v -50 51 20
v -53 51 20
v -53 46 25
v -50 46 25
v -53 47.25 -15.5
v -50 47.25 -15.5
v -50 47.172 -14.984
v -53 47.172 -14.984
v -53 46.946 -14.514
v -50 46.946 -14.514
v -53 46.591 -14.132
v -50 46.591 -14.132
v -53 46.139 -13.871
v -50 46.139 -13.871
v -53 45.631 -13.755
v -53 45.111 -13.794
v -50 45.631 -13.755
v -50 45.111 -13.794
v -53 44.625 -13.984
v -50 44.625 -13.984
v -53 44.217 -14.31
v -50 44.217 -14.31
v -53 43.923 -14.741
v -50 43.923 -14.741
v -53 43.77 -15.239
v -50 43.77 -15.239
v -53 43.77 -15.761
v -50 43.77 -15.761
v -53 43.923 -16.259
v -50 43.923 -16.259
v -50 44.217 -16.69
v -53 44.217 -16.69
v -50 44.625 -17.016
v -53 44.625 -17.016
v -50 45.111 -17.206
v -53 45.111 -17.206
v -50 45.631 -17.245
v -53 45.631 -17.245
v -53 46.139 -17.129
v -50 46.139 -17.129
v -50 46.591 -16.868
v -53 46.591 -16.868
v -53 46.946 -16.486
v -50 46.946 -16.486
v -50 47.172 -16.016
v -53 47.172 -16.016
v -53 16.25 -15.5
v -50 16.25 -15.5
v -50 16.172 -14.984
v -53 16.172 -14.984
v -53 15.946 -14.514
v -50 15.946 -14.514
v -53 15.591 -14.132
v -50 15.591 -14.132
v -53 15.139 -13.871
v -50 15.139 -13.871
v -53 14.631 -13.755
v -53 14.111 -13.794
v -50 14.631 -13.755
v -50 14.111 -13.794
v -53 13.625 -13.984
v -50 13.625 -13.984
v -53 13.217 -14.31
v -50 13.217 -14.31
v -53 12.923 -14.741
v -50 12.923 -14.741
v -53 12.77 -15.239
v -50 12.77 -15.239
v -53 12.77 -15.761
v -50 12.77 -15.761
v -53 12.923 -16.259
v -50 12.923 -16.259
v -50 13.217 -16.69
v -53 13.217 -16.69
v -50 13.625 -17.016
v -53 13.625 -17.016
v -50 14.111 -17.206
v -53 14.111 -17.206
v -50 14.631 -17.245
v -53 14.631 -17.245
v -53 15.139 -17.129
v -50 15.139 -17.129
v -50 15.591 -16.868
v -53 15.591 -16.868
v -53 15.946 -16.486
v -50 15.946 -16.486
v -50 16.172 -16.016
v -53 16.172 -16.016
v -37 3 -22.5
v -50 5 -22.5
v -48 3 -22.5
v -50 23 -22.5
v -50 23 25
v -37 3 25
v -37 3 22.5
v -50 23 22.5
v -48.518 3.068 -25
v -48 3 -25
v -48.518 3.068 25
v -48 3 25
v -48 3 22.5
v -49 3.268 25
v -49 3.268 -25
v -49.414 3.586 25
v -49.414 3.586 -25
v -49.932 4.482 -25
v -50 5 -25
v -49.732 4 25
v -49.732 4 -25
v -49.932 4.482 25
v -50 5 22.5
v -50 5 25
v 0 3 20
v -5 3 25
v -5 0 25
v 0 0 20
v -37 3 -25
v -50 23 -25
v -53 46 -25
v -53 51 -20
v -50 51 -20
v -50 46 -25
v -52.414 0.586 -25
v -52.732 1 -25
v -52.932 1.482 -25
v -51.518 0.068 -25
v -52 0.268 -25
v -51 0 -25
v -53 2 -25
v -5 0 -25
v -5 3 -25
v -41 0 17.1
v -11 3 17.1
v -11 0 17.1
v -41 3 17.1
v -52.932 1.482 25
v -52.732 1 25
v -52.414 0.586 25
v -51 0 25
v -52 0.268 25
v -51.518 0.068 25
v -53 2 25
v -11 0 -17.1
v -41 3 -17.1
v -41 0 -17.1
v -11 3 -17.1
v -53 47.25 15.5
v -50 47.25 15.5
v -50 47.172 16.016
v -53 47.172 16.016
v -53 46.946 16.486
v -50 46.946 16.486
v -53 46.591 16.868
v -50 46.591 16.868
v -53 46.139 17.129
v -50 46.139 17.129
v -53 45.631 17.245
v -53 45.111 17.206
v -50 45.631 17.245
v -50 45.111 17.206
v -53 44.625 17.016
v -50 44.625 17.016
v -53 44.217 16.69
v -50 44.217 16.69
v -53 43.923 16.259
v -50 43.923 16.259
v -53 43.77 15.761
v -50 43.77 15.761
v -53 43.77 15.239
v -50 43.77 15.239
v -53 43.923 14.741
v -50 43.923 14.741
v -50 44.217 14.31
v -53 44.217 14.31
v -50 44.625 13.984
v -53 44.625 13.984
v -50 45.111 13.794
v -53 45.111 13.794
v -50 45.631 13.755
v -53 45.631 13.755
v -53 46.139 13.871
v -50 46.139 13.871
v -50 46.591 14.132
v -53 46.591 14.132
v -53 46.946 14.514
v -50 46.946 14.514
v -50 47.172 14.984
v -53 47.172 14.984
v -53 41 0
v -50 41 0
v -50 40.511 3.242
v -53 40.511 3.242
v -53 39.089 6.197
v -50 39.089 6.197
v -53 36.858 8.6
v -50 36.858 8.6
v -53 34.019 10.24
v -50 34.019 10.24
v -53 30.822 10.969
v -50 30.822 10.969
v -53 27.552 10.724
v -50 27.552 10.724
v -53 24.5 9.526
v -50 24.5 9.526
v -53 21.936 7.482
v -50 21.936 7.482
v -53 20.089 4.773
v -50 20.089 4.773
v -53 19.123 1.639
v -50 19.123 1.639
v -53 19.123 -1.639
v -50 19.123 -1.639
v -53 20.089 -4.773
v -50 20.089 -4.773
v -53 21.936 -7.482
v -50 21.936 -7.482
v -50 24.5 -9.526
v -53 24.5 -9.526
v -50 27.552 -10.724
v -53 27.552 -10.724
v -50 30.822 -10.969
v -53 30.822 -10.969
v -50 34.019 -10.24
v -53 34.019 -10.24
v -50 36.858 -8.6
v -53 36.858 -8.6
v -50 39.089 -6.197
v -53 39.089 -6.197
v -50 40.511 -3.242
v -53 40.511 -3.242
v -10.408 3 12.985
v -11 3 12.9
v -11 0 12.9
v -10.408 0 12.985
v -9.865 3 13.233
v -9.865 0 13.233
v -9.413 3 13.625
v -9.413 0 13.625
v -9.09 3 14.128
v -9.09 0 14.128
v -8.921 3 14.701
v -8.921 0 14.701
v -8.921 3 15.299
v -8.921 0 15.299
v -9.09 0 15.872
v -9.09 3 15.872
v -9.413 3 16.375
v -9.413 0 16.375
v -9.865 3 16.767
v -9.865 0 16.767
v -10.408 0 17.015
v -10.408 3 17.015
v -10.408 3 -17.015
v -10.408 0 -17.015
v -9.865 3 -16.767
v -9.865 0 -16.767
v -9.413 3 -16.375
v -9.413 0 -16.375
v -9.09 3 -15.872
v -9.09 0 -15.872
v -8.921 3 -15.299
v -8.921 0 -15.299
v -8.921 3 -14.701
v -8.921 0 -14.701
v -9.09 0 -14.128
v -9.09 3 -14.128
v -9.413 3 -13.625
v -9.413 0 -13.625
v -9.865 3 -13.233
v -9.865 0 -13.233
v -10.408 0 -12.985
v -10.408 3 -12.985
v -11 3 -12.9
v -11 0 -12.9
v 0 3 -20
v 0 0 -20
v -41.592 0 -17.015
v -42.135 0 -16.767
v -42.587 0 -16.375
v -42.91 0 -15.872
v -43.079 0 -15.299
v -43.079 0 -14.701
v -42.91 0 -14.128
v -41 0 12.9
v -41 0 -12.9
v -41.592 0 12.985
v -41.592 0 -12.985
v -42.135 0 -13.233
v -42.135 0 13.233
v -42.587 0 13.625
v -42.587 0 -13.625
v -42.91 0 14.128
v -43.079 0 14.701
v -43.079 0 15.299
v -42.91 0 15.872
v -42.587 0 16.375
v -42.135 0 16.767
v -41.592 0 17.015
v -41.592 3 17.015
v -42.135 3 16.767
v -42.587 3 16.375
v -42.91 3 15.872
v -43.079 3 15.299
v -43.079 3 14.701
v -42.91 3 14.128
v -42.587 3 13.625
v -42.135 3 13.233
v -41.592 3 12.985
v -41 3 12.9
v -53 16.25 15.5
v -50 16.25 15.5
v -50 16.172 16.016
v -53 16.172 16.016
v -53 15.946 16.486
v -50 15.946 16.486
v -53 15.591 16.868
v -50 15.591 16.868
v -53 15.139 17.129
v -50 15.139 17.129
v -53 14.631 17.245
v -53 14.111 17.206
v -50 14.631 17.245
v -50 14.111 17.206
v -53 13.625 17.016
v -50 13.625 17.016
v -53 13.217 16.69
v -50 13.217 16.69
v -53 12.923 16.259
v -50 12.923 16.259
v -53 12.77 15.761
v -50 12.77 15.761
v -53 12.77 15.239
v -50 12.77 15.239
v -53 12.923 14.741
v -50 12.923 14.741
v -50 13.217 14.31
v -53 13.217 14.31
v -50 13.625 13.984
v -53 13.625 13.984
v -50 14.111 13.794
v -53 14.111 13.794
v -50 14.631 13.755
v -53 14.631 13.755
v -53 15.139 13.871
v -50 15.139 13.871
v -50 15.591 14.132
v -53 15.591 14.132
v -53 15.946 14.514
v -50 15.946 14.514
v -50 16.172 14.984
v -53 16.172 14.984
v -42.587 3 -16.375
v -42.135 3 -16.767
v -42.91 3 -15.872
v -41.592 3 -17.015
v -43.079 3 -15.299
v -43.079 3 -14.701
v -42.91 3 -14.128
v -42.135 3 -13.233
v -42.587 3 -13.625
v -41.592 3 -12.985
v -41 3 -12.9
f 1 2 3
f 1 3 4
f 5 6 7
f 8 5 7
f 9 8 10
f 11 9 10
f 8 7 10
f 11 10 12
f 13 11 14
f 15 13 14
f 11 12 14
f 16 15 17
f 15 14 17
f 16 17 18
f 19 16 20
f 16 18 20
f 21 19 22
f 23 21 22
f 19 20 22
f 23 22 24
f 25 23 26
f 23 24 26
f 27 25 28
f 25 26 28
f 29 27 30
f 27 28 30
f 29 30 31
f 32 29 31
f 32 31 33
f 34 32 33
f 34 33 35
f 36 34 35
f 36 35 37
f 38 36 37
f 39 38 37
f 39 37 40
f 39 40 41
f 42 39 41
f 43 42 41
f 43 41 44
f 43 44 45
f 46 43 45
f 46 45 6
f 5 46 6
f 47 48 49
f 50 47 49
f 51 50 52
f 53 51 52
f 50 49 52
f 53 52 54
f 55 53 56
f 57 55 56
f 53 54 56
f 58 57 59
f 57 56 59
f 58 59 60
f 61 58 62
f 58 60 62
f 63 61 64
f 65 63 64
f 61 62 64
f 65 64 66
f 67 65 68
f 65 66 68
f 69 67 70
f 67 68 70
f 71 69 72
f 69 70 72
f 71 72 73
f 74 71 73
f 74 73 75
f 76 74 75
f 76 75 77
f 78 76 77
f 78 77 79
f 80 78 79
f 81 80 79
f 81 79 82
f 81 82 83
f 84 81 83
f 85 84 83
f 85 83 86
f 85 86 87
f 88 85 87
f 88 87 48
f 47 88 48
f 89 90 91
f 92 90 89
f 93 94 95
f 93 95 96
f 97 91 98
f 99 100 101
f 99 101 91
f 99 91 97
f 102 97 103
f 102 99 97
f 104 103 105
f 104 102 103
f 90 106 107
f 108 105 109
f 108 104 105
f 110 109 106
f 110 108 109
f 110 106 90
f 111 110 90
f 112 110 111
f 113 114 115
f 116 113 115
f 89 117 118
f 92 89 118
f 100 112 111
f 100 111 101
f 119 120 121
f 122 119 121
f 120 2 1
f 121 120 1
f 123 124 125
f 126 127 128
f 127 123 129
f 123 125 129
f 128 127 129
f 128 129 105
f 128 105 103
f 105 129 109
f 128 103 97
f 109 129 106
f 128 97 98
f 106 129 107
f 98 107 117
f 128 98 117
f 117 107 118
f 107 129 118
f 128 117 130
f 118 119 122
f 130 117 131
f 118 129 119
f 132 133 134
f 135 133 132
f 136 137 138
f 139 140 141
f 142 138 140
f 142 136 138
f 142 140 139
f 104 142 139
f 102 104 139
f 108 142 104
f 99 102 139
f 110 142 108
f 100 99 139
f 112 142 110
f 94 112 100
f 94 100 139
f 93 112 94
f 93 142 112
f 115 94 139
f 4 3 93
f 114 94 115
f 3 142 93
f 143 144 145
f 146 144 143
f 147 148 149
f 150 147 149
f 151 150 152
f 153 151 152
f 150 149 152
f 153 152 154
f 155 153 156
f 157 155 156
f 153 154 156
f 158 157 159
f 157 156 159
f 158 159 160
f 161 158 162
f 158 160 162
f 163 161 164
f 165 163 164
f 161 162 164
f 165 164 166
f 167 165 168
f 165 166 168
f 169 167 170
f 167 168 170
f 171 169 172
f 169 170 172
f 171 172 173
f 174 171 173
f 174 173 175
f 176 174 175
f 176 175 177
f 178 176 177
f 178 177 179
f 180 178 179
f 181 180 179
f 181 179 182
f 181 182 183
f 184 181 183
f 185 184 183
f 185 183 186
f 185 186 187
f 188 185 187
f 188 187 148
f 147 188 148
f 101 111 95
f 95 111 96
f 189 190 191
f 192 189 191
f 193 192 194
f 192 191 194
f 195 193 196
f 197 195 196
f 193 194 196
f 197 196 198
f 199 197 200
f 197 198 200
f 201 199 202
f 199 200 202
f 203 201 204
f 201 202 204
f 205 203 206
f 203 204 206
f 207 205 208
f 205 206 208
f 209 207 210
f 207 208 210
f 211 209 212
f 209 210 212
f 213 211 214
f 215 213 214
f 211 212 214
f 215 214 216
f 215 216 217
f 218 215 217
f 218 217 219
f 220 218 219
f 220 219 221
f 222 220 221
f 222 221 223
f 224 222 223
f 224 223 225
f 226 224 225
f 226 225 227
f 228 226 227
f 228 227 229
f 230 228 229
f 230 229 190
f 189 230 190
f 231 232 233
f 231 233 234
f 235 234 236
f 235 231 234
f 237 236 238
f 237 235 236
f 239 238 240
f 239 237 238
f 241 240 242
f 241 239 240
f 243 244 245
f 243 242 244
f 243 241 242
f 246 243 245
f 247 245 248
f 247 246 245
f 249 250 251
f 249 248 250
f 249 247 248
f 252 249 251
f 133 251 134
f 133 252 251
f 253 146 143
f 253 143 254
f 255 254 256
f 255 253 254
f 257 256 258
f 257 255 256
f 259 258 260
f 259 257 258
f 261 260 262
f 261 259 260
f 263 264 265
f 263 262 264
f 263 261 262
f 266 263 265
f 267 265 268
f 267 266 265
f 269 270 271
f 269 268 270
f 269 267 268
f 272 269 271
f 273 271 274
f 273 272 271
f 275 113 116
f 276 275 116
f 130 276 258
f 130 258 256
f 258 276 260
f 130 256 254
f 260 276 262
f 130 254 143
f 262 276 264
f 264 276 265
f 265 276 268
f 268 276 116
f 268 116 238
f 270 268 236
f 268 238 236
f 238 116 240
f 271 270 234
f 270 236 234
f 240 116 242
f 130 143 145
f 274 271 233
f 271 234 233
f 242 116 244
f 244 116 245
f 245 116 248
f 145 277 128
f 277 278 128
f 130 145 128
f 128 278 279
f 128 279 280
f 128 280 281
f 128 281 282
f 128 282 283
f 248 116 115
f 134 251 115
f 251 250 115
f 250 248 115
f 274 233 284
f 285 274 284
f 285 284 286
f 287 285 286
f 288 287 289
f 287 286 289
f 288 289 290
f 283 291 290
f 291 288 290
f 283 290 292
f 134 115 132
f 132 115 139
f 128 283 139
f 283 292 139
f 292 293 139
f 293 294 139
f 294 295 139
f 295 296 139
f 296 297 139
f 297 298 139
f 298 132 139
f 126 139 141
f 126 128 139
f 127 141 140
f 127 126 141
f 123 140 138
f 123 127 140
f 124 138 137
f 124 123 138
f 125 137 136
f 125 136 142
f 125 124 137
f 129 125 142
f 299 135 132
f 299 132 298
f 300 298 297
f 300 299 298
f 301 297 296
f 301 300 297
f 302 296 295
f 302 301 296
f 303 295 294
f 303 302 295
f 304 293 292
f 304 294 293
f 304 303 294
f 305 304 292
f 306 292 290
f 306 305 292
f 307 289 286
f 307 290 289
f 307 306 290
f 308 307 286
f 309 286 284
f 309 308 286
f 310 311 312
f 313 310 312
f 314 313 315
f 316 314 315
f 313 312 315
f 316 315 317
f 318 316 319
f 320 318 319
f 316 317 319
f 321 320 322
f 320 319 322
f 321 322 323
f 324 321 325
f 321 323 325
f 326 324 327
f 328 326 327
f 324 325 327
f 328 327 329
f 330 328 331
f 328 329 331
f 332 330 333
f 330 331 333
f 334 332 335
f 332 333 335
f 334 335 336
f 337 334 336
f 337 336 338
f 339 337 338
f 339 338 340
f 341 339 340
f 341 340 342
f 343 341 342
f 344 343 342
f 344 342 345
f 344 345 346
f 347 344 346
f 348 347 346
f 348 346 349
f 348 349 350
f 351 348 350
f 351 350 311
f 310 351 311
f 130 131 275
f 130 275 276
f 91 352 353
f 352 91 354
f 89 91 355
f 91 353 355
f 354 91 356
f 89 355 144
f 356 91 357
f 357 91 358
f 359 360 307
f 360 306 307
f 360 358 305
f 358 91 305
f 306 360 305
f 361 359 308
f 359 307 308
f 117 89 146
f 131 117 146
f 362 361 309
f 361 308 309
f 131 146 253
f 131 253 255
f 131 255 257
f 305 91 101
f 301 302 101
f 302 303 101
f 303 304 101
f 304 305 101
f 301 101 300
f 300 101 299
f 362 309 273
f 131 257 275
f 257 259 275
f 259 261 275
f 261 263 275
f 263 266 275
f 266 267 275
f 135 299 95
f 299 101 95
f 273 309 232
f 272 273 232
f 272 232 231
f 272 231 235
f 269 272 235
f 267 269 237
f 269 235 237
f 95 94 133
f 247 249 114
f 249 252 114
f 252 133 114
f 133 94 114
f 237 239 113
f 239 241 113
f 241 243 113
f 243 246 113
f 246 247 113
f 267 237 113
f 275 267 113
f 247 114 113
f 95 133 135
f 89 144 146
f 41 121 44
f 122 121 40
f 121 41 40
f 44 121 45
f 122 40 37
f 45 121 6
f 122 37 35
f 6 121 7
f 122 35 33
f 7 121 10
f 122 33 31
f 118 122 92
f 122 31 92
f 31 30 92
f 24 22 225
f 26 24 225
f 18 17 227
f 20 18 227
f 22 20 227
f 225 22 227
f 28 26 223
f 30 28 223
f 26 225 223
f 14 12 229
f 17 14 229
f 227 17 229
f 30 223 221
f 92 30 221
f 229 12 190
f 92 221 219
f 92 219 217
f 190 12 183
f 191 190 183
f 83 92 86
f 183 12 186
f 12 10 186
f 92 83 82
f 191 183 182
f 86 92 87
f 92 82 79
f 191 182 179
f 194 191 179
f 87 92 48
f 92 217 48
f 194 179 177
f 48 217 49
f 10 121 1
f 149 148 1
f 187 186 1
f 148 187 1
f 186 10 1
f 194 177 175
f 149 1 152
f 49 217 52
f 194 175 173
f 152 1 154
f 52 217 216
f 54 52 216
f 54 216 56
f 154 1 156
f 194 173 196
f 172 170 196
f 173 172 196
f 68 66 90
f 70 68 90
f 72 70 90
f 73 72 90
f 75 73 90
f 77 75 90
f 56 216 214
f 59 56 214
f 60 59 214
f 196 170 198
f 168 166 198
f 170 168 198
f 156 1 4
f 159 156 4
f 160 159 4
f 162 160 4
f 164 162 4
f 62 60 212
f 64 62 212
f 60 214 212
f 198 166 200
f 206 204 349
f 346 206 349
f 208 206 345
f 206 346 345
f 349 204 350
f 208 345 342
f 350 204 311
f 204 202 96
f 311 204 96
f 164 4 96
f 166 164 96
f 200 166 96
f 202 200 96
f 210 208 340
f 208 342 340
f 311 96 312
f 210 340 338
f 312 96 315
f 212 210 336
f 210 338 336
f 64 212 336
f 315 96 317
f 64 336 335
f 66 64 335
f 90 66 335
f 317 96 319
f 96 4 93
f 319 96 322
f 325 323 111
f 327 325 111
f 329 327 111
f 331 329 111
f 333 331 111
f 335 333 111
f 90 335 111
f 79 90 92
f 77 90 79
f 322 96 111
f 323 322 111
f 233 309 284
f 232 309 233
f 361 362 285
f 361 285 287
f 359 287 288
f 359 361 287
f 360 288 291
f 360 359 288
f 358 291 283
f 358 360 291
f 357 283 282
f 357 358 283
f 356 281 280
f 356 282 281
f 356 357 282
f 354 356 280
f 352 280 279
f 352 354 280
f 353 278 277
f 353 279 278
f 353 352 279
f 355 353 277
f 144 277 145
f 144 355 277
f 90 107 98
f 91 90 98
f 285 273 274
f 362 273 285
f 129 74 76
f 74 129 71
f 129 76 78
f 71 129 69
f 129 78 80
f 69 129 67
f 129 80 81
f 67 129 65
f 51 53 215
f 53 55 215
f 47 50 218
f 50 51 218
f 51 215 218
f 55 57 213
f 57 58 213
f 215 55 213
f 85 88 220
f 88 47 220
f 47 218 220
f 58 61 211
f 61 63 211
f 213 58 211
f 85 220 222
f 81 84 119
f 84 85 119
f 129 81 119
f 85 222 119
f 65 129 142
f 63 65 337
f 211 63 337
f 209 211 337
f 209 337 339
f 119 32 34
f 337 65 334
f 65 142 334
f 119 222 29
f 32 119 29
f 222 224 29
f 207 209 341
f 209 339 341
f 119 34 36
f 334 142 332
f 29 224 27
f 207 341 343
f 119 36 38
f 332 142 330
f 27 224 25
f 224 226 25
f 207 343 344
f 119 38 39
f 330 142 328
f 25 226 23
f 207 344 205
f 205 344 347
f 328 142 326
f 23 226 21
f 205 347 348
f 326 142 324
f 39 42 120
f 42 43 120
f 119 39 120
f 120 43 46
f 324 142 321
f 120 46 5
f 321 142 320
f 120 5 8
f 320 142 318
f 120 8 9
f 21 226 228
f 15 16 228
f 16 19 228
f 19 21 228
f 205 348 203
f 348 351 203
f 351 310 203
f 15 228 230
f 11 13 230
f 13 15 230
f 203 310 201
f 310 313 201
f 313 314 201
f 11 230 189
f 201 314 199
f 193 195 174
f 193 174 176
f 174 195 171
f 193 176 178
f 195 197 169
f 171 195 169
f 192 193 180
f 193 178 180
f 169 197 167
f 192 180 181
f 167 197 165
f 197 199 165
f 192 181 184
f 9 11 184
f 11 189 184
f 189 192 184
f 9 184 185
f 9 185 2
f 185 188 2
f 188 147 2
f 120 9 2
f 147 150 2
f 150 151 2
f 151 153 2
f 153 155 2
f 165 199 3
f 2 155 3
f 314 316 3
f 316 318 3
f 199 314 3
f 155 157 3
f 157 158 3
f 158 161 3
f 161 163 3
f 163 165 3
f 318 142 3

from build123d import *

# Parameters (mm, degrees)
EXTRUDE_1_DEPTH     = 25
CUT_EXTRUDE_1_REACH = 77.67
SKETCH_2_R          = 11
SKETCH_2_R_2        = 1.75
CUT_EXTRUDE_2_REACH = 77.75
CHAMFER_1_SIZE      = 5
FILLET_1_R          = 2
EXTRUDE_2_DEPTH     = 2.5


with BuildPart() as part:
    # 草图1 → 凸台-拉伸1 (new, symmetric)
    with BuildSketch(Plane.XY):
        Polygon((0, 0), (-53, 0), (-53, 51), (-50, 51), (-50, 3), (0, 3), align=None)
    extrude(amount=EXTRUDE_1_DEPTH, both=True)

    # 草图2 → 切除-拉伸1 (cut, up to next)
    with BuildSketch(Plane(origin=(-50, 0, 0), x_dir=(0, 0, -1), z_dir=(1, 0, 0)), mode=Mode.PRIVATE) as cut_extrude_1_sk1:
        with Locations(Location((0, 30, 0), (0, 0, 90))):
            Circle(SKETCH_2_R)
    cut_extrude_1_tool1 = extrude(cut_extrude_1_sk1.sketch, amount=-CUT_EXTRUDE_1_REACH, mode=Mode.PRIVATE) & part.part
    # 草图2 → 切除-拉伸1 (cut, up to next)
    with BuildSketch(Plane(origin=(-50, 0, 0), x_dir=(0, 0, -1), z_dir=(1, 0, 0)), mode=Mode.PRIVATE) as cut_extrude_1_sk2:
        with Locations(Location((-15.5, 45.5, 0), (0, 0, 90))):
            Circle(SKETCH_2_R_2)
    cut_extrude_1_tool2 = extrude(cut_extrude_1_sk2.sketch, amount=-CUT_EXTRUDE_1_REACH, mode=Mode.PRIVATE) & part.part
    # 草图2 → 切除-拉伸1 (cut, up to next)
    with BuildSketch(Plane(origin=(-50, 0, 0), x_dir=(0, 0, -1), z_dir=(1, 0, 0)), mode=Mode.PRIVATE) as cut_extrude_1_sk3:
        with Locations(Location((15.5, 45.5, 0), (0, 0, 90))):
            Circle(SKETCH_2_R_2)
    cut_extrude_1_tool3 = extrude(cut_extrude_1_sk3.sketch, amount=-CUT_EXTRUDE_1_REACH, mode=Mode.PRIVATE) & part.part
    # 草图2 → 切除-拉伸1 (cut, up to next)
    with BuildSketch(Plane(origin=(-50, 0, 0), x_dir=(0, 0, -1), z_dir=(1, 0, 0)), mode=Mode.PRIVATE) as cut_extrude_1_sk4:
        with Locations(Location((-15.5, 14.5, 0), (0, 0, 90))):
            Circle(SKETCH_2_R_2)
    cut_extrude_1_tool4 = extrude(cut_extrude_1_sk4.sketch, amount=-CUT_EXTRUDE_1_REACH, mode=Mode.PRIVATE) & part.part
    # 草图2 → 切除-拉伸1 (cut, up to next)
    with BuildSketch(Plane(origin=(-50, 0, 0), x_dir=(0, 0, -1), z_dir=(1, 0, 0)), mode=Mode.PRIVATE) as cut_extrude_1_sk5:
        with Locations(Location((15.5, 14.5, 0), (0, 0, 90))):
            Circle(SKETCH_2_R_2)
    cut_extrude_1_tool5 = extrude(cut_extrude_1_sk5.sketch, amount=-CUT_EXTRUDE_1_REACH, mode=Mode.PRIVATE) & part.part
    add(cut_extrude_1_tool1.solids().sort_by_distance((-50, 30, 0))[0], mode=Mode.SUBTRACT)
    add(cut_extrude_1_tool2.solids().sort_by_distance((-50, 45.5, 15.5))[0], mode=Mode.SUBTRACT)
    add(cut_extrude_1_tool3.solids().sort_by_distance((-50, 45.5, -15.5))[0], mode=Mode.SUBTRACT)
    add(cut_extrude_1_tool4.solids().sort_by_distance((-50, 14.5, 15.5))[0], mode=Mode.SUBTRACT)
    add(cut_extrude_1_tool5.solids().sort_by_distance((-50, 14.5, -15.5))[0], mode=Mode.SUBTRACT)

    # 草图3 → 切除-拉伸2 (cut, up to next)
    with BuildSketch(Plane(origin=(0, 3, 0), x_dir=(1, 0, 0), z_dir=(0, 1, 0)), mode=Mode.PRIVATE) as cut_extrude_2_sk1:
        with BuildLine():
            Line((-41, 17.1), (-11, 17.1))
            ThreePointArc((-11, 17.1), (-8.9, 15), (-11, 12.9))
            Line((-11, 12.9), (-41, 12.9))
            ThreePointArc((-41, 12.9), (-43.1, 15), (-41, 17.1))
        make_face()
    cut_extrude_2_tool1 = extrude(cut_extrude_2_sk1.sketch, amount=-CUT_EXTRUDE_2_REACH, mode=Mode.PRIVATE) & part.part
    # 草图3 → 切除-拉伸2 (cut, up to next)
    with BuildSketch(Plane(origin=(0, 3, 0), x_dir=(1, 0, 0), z_dir=(0, 1, 0)), mode=Mode.PRIVATE) as cut_extrude_2_sk2:
        with BuildLine():
            Line((-41, -12.9), (-11, -12.9))
            ThreePointArc((-11, -12.9), (-8.9, -15), (-11, -17.1))
            Line((-11, -17.1), (-41, -17.1))
            ThreePointArc((-41, -17.1), (-43.1, -15), (-41, -12.9))
        make_face()
    cut_extrude_2_tool2 = extrude(cut_extrude_2_sk2.sketch, amount=-CUT_EXTRUDE_2_REACH, mode=Mode.PRIVATE) & part.part
    add(cut_extrude_2_tool1.solids().sort_by_distance((-26, 3, -15))[0], mode=Mode.SUBTRACT)
    add(cut_extrude_2_tool2.solids().sort_by_distance((-26, 3, 15))[0], mode=Mode.SUBTRACT)

    # 倒角1
    chamfer_1_edges = [part.edges().sort_by_distance(p)[0] for p in [
        (-51.5, 51, 25),
        (0, 1.5, 25),
        (-51.5, 51, -25),
        (0, 1.5, -25),
    ]]
    chamfer(chamfer_1_edges, length=CHAMFER_1_SIZE)

    # 圆角1
    fillet_1_edges = [part.edges().sort_by_distance(p)[0] for p in [
        (-53, 0, 0),
        (-50, 3, 0),
    ]]
    fillet(fillet_1_edges, radius=FILLET_1_R)

    # 草图4 → 凸台-拉伸2 (add)
    with BuildSketch(Plane.XY.offset(25)):
        Polygon((-50, 23), (-50, 5), (-48, 3), (-37, 3), align=None)
    extrude_2 = extrude(amount=-EXTRUDE_2_DEPTH)

    # 镜向1: 凸台-拉伸2 across plane
    add(extrude_2.mirror(Plane.XY))


solid = part.part
